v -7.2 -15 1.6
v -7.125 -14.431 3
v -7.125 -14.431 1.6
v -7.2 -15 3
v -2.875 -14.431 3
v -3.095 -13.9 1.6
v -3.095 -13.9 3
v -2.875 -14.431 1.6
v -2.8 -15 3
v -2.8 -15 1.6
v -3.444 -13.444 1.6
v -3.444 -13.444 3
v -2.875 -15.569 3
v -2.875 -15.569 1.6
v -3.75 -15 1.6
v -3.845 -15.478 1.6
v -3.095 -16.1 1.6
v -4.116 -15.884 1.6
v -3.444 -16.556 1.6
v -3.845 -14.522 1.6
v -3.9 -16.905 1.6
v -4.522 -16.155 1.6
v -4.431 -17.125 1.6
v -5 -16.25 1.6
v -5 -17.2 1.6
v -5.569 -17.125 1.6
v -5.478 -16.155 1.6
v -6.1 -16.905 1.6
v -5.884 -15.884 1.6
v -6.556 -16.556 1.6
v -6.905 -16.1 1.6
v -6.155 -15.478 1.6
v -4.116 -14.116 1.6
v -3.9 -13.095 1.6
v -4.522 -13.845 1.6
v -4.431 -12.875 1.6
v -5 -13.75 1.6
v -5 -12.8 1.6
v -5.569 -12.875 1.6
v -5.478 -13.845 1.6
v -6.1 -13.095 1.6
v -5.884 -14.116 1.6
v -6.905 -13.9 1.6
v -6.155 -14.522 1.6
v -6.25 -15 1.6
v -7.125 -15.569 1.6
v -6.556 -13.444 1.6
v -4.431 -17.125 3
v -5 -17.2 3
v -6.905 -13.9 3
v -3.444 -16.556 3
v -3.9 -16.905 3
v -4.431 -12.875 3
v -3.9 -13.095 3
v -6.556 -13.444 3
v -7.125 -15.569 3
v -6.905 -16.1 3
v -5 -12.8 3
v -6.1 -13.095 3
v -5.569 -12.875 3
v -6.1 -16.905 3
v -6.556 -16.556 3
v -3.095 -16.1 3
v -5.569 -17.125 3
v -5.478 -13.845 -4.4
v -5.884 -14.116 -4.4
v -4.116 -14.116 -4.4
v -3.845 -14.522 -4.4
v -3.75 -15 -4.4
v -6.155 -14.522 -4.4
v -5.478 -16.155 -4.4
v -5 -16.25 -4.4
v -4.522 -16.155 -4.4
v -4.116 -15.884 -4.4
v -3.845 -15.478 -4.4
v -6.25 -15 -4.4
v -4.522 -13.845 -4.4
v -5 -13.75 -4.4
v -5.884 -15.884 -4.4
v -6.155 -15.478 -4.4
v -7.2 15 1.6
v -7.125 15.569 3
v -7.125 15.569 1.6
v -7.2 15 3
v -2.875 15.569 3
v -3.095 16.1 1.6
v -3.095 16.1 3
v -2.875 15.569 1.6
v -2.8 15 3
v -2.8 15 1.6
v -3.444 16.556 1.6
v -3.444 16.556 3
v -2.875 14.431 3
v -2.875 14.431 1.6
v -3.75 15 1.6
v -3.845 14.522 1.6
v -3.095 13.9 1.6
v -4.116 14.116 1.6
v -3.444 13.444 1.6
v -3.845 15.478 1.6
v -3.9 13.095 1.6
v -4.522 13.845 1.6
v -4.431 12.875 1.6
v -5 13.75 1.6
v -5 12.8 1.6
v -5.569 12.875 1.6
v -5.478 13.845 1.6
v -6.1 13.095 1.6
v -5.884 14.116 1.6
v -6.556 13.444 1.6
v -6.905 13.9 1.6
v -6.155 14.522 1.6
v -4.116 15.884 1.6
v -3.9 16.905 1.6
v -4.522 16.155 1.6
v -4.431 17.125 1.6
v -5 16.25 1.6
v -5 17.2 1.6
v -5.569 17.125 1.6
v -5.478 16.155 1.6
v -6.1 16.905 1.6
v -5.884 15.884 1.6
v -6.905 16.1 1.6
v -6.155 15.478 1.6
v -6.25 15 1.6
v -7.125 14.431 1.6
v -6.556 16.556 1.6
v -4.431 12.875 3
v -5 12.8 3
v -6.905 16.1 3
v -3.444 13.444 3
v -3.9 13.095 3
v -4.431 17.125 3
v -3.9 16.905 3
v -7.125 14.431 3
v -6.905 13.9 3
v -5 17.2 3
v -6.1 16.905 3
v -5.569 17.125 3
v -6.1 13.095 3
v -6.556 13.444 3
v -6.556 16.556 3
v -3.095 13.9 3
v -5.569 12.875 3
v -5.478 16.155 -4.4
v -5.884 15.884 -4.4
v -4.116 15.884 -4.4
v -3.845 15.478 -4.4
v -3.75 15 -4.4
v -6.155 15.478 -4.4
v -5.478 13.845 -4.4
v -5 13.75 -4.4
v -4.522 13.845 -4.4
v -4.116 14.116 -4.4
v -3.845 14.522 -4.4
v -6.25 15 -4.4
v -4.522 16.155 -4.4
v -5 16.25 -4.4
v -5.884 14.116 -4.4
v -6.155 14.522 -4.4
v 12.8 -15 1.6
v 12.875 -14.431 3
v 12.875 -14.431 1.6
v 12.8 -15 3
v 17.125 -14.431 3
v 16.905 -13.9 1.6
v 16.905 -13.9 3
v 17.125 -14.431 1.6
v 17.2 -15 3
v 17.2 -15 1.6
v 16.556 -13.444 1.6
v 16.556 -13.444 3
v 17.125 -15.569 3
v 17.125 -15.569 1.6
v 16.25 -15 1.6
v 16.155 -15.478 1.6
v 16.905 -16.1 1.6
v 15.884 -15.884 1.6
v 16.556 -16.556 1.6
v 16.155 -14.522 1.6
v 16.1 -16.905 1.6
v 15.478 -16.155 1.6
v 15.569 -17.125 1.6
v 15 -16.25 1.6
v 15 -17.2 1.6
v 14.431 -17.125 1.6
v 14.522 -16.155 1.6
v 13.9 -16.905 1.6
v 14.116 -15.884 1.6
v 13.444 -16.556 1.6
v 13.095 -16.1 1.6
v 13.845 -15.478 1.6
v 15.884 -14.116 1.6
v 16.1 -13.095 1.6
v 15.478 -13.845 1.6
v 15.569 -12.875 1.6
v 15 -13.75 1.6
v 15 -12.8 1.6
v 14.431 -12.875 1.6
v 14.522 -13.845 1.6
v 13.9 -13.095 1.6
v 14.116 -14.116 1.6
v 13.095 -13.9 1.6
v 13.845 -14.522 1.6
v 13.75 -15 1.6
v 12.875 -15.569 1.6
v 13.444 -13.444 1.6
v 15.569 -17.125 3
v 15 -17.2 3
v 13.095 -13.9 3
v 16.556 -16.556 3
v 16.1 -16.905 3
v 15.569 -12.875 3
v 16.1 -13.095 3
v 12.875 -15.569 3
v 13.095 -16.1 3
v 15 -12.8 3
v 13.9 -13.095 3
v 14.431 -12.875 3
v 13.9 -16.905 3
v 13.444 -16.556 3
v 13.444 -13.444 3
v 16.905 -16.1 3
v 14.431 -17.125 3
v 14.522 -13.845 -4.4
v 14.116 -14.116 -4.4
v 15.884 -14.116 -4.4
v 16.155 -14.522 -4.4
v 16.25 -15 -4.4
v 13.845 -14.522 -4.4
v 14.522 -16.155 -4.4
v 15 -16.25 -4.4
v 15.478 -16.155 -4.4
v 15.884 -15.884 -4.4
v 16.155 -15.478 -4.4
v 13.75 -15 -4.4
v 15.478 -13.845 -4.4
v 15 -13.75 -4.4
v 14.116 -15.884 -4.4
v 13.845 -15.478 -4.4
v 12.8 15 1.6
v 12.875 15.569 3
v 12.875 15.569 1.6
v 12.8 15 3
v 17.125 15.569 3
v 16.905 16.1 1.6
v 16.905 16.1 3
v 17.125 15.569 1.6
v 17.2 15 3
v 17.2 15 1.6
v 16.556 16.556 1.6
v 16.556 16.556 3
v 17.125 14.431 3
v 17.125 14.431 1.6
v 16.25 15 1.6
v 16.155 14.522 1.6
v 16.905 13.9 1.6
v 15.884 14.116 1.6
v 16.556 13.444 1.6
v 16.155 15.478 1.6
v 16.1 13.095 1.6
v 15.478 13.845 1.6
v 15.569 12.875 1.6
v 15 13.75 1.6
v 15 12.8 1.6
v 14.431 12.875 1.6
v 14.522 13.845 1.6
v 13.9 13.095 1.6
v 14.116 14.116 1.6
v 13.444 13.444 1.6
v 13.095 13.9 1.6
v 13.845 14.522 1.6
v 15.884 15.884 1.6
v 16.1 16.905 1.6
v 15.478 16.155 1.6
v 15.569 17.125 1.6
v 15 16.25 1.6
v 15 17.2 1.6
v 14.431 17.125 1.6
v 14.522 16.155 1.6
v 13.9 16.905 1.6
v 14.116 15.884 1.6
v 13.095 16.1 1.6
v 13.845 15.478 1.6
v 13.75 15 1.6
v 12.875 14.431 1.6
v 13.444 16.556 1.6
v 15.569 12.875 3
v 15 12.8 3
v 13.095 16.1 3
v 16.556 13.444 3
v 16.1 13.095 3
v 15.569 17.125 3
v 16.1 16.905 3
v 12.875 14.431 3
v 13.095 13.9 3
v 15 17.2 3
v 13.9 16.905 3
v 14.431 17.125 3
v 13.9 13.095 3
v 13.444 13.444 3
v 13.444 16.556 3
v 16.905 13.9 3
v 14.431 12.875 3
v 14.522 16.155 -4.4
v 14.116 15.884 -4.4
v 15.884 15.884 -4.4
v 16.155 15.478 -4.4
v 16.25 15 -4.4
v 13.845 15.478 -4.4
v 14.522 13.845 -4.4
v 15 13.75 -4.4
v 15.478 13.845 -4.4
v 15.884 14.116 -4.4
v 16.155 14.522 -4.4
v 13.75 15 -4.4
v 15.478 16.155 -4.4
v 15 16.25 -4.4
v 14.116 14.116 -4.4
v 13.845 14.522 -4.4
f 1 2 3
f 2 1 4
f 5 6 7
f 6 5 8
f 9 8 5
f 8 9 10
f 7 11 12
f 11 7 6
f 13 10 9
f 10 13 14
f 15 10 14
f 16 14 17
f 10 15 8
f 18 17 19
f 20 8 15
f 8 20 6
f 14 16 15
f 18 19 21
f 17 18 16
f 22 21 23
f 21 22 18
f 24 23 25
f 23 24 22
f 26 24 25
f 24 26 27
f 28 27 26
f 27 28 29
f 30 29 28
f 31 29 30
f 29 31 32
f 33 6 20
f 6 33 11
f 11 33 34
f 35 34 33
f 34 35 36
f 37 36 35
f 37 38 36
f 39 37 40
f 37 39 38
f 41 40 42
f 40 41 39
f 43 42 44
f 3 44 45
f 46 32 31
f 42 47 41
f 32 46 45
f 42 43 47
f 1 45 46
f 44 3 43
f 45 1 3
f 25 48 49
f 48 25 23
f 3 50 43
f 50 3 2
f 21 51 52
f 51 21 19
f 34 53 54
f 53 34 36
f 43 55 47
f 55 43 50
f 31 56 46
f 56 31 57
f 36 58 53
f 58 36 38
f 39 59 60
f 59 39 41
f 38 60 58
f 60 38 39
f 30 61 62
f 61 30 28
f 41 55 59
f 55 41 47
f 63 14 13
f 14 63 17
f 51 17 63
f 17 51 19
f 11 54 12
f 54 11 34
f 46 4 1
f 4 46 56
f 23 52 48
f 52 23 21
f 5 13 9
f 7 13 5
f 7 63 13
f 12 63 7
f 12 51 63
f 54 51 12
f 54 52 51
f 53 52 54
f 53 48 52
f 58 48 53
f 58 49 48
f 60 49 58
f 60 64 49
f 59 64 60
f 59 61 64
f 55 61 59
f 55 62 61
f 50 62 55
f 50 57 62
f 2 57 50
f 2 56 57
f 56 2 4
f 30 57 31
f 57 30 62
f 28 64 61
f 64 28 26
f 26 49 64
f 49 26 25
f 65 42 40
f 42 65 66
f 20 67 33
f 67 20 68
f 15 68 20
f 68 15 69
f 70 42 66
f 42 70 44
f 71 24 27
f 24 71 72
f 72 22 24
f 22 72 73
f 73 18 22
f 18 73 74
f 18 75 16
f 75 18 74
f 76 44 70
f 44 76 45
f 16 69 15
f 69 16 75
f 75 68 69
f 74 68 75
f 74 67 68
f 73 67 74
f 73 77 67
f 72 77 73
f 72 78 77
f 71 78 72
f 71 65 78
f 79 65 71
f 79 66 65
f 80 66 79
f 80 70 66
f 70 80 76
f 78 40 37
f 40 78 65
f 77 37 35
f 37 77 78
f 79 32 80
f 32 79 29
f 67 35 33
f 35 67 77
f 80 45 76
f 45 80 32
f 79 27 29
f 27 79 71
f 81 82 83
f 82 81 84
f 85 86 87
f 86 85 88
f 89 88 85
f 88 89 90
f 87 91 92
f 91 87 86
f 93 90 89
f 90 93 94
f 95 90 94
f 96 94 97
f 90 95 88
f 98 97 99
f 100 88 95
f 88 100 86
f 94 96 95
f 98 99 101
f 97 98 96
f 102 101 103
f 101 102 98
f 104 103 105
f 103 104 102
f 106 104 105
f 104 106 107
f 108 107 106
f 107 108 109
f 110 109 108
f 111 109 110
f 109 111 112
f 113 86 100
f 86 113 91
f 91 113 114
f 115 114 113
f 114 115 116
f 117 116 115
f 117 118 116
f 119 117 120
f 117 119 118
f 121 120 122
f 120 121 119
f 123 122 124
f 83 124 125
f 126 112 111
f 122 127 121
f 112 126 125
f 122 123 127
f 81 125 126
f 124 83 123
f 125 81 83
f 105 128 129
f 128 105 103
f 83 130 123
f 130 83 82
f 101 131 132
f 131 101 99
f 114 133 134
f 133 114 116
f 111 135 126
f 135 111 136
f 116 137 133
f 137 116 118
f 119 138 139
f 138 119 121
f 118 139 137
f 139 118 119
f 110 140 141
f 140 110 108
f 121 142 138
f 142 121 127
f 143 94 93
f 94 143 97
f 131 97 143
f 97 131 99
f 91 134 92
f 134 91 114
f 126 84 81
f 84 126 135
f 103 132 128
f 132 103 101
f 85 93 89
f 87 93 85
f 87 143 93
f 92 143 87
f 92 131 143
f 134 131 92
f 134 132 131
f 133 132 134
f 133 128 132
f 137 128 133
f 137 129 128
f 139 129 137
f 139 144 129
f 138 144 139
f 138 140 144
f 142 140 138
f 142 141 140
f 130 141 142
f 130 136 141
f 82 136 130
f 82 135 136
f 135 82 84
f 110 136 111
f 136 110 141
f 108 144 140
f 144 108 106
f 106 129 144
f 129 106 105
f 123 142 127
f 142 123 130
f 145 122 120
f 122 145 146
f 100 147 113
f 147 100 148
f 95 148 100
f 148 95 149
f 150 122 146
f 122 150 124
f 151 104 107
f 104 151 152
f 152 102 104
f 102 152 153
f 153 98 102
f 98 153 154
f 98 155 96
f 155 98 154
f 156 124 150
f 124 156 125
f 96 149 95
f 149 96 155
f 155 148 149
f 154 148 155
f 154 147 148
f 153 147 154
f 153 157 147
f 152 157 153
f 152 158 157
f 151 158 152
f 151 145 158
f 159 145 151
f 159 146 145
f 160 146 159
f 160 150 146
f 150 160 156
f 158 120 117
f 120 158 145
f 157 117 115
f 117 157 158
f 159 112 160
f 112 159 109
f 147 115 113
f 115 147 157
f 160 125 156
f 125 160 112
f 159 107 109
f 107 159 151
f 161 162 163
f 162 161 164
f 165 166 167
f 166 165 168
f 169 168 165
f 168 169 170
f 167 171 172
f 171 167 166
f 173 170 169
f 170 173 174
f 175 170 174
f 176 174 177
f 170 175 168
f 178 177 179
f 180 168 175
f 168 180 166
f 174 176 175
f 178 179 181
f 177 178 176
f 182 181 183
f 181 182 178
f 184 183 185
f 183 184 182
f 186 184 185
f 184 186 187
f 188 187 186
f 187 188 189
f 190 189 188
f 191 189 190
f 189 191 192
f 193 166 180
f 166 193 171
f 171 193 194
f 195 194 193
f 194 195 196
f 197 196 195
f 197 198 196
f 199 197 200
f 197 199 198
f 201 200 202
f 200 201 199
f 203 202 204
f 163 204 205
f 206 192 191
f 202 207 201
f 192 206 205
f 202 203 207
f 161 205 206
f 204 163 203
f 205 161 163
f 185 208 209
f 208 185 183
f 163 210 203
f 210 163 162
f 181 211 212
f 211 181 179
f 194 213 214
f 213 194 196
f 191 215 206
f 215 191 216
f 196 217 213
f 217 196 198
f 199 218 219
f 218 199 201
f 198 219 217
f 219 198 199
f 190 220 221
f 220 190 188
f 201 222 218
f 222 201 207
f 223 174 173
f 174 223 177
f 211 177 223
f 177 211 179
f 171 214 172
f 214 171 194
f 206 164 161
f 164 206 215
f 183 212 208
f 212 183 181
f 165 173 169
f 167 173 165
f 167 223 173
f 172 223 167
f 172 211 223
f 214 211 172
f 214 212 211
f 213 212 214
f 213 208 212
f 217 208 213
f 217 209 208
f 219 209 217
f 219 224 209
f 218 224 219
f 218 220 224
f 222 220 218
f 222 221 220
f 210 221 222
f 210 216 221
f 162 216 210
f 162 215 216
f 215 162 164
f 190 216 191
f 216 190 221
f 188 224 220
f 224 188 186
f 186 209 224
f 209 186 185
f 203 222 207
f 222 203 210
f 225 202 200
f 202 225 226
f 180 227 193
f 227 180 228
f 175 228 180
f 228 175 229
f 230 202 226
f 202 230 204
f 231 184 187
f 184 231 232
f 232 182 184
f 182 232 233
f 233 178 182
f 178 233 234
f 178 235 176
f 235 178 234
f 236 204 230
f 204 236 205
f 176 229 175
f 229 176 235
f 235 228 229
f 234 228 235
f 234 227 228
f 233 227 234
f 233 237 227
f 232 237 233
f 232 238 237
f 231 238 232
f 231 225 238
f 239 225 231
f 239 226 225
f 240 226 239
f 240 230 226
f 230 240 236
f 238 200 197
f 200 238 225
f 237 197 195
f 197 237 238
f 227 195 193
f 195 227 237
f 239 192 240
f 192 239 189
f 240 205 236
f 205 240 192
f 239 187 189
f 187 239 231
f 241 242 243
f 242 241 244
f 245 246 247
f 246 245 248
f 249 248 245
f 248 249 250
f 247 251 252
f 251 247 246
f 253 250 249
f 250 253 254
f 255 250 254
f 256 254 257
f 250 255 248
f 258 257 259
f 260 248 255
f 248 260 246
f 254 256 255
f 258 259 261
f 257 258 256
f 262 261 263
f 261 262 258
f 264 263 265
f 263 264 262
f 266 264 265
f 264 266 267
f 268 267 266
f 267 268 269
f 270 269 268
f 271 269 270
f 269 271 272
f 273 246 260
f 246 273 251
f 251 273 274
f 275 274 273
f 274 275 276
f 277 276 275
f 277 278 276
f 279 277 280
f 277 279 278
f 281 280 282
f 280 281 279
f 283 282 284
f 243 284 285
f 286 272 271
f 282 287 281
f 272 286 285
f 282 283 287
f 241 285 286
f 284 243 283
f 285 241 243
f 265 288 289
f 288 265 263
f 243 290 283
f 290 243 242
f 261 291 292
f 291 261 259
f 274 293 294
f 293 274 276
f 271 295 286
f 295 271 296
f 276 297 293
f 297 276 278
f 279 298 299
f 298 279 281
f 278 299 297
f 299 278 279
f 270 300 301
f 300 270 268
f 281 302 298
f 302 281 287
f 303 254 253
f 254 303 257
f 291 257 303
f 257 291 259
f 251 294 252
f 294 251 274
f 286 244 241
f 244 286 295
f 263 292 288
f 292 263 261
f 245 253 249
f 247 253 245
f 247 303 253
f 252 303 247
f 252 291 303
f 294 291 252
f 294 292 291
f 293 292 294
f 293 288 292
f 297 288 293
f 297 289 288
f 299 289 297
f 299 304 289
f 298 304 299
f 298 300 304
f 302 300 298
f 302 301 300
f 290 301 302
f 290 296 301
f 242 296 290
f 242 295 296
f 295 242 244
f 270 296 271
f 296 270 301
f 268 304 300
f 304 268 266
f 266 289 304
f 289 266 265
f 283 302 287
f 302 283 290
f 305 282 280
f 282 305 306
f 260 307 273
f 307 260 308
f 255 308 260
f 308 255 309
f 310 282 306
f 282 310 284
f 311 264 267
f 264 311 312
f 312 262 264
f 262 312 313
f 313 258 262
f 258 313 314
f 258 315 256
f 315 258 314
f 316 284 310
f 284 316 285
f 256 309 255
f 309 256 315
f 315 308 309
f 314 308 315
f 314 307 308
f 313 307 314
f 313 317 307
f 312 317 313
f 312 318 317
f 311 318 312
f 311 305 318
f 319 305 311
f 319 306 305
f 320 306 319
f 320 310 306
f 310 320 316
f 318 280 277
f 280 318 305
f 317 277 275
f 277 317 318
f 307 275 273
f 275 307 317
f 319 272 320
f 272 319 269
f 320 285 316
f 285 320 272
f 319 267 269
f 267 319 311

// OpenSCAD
// file: ../../screw-post/screw-post.scad
//-----------------------------------------------------------------------
// Screw post: a round post off the floor that a board screws down onto
//
// Two ways to fix:
//   "nut"  clearance hole through the post and floor; the nut sits in a hex
//          trap in the floor's underside, so the screw goes in from the top
//   "tap"  a pilot hole the screw cuts its own thread in (one or two fittings
//          in PLA/PETG); blind, the floor stays whole underneath
// and "head" for a screw up from below (head in a counterbore, nut on top).
//
// Modules, all in the same frame:
//   screwPostGhost()     the screw (and nut), for previews
//   screwPost()          the post: add to the floor
//   screwPostFloorCut()  subtract from the floor: nut trap / counterbore and hole
//
// Frame: origin on the floor top, on the post's axis. Z up; the floor is
// Z = -floorThick .. 0. Units: mm.
//
// Sizes: "M2", "M2.5", "M3". screwPostScrew(size, ...) says which screw length
// reaches, so a project can assert it has that screw in the kit.
//-----------------------------------------------------------------------

//-- [name, screw Ø, nut across flats, nut thick, head Ø, head height, tap hole, post Ø]
//-- Nuts ISO 4032; heads ISO 7380 button. Tap holes: the usual ~0.8 x Ø for plastic
screwSizes = [
  ["M2",   2.0, 4.0, 1.6, 3.5, 1.1, 1.6, 5.0],
  ["M2.5", 2.5, 5.0, 2.0, 4.4, 1.4, 2.1, 6.0],    // head 4.4: measured on the kit's M2.5 (controller base)
  ["M3",   3.0, 5.5, 2.4, 5.7, 1.65, 2.5, 7.0],
];

screwHoleClear = 0.4;     // added to the screw Ø for a clearance hole
screwNutClear  = 0.3;     // CAL: across flats, nut trap over the nut. Set by the fit piece
screwTapClear  = 0.0;     // CAL: added to the tap hole. Set by the fit piece
screwHeadClear = 0.6;     // counterbore over the head Ø

function screwSize(size) = let (i = search([size], screwSizes)[0])
  assert(i != [] && i != undef, str("unknown screw size ", size)) screwSizes[i];
function screwDia(size)    = screwSize(size)[1];
function screwNutAF(size)  = screwSize(size)[2];
function screwNutH(size)   = screwSize(size)[3];
function screwHeadDia(size)= screwSize(size)[4];
function screwHeadH(size)  = screwSize(size)[5];
function screwPostDia(size)= screwSize(size)[7];

//-- Shortest screw that fills the nut, from the top of the clamped part (h + clamp
//-- above the floor) down to the nut trap's underside. Round up to a length you have.
function screwPostScrew(size, h, floorThick, clamp = 1.6) = h + clamp + floorThick;

module screwPostGhost(size, h, floorThick, clamp = 1.6, length, how = "nut")
{
  d = screwDia(size);
  L = is_undef(length) ? screwPostScrew(size, h, floorThick, clamp) : length;
  top = h + clamp;
  if (how == "head")
  {
    %color("Silver") translate([0, 0, -floorThick]) cylinder(d = screwHeadDia(size), h = screwHeadH(size), $fn = 24);
    %color("Silver") translate([0, 0, -floorThick + screwHeadH(size)]) cylinder(d = d, h = L, $fn = 16);
  }
  else
  {
    %color("Silver") translate([0, 0, top]) cylinder(d = screwHeadDia(size), h = screwHeadH(size), $fn = 24);
    %color("Silver") translate([0, 0, top - L]) cylinder(d = d, h = L, $fn = 16);
    if (how == "nut")
      %color("DimGray") translate([0, 0, -floorThick]) rotate([0, 0, 30]) cylinder(d = screwNutAF(size)/cos(30), h = screwNutH(size), $fn = 6);
  }
}

//-- how: "nut" | "head" (through hole) or "tap" (blind pilot hole). postDia defaults by size
module screwPost(size, h, how = "nut", postDia, tapClear = screwTapClear)
{
  pd = is_undef(postDia) ? screwPostDia(size) : postDia;
  hole = how == "tap" ? screwSize(size)[6] + tapClear : screwDia(size) + screwHoleClear;
  difference()
  {
    translate([0, 0, -0.01]) cylinder(d = pd, h = h + 0.01, $fn = 40);
    translate([0, 0, how == "tap" ? 0.6 : -1]) cylinder(d = hole, h = h + 2, $fn = 24);
    //-- lead-in so the screw starts square
    translate([0, 0, h - 0.4]) cylinder(d1 = hole, d2 = hole + 0.8, h = 0.41, $fn = 24);
  }
}

//-- "nut": hex trap from the underside, opening a little over the nut so it sits flush.
//-- "head": counterbore for the head. "tap": nothing.
module screwPostFloorCut(size, floorThick, how = "nut", nutClear = screwNutClear)
{
  d = screwDia(size) + screwHoleClear;
  if (how == "nut")
  {
    af = screwNutAF(size) + nutClear;
    translate([0, 0, -floorThick - 1]) rotate([0, 0, 30]) cylinder(d = af/cos(30), h = screwNutH(size) + 0.1 + 1, $fn = 6);
    translate([0, 0, -floorThick - 1]) cylinder(d = d + 0.4, h = floorThick + 2, $fn = 24);
  }
  if (how == "head")
  {
    translate([0, 0, -floorThick - 1]) cylinder(d = screwHeadDia(size) + screwHeadClear, h = screwHeadH(size) + 0.2 + 1, $fn = 32);
    translate([0, 0, -floorThick - 1]) cylinder(d = d + 0.4, h = floorThick + 2, $fn = 24);
  }
  assert(how == "tap" || floorThick >= (how == "nut" ? screwNutH(size) : screwHeadH(size)) + 0.1 + 0.3,
         str("floor too thin for the ", size, " ", how));
}
// main file
// The screws (and nuts) as solids, for the catalogue (the Ghost is % so it never renders).
// scene = "bench": the 3 x 4 carrier's four screws on the bench
// scene = "floor": the screws of both carriers in floor.scad, and the nuts under the "nut" one
include <../carrier.scad>

scene = "bench";

if (scene == "bench")
{
  at = crOnBench(6, 6, 3, 4, 2, 1);
  translate([at[0], at[1], crSeatZ("bench")]) carrierScrews(3, 4);
}
if (scene == "floor")
{
  floorThick = 2.4;
  translate([-20, 0, crSeatZ("tap")]) carrierScrews(3, 2);
  translate([20, 0, crSeatZ("nut")]) carrierScrews(3, 2);
  for (p = crHoles(3, 2))
    translate([20 + p[0], p[1], -floorThick]) rotate([0, 0, 30])
      cylinder(d = screwNutAF(crScrew)/cos(30), h = screwNutH(crScrew), $fn = 6);
}
